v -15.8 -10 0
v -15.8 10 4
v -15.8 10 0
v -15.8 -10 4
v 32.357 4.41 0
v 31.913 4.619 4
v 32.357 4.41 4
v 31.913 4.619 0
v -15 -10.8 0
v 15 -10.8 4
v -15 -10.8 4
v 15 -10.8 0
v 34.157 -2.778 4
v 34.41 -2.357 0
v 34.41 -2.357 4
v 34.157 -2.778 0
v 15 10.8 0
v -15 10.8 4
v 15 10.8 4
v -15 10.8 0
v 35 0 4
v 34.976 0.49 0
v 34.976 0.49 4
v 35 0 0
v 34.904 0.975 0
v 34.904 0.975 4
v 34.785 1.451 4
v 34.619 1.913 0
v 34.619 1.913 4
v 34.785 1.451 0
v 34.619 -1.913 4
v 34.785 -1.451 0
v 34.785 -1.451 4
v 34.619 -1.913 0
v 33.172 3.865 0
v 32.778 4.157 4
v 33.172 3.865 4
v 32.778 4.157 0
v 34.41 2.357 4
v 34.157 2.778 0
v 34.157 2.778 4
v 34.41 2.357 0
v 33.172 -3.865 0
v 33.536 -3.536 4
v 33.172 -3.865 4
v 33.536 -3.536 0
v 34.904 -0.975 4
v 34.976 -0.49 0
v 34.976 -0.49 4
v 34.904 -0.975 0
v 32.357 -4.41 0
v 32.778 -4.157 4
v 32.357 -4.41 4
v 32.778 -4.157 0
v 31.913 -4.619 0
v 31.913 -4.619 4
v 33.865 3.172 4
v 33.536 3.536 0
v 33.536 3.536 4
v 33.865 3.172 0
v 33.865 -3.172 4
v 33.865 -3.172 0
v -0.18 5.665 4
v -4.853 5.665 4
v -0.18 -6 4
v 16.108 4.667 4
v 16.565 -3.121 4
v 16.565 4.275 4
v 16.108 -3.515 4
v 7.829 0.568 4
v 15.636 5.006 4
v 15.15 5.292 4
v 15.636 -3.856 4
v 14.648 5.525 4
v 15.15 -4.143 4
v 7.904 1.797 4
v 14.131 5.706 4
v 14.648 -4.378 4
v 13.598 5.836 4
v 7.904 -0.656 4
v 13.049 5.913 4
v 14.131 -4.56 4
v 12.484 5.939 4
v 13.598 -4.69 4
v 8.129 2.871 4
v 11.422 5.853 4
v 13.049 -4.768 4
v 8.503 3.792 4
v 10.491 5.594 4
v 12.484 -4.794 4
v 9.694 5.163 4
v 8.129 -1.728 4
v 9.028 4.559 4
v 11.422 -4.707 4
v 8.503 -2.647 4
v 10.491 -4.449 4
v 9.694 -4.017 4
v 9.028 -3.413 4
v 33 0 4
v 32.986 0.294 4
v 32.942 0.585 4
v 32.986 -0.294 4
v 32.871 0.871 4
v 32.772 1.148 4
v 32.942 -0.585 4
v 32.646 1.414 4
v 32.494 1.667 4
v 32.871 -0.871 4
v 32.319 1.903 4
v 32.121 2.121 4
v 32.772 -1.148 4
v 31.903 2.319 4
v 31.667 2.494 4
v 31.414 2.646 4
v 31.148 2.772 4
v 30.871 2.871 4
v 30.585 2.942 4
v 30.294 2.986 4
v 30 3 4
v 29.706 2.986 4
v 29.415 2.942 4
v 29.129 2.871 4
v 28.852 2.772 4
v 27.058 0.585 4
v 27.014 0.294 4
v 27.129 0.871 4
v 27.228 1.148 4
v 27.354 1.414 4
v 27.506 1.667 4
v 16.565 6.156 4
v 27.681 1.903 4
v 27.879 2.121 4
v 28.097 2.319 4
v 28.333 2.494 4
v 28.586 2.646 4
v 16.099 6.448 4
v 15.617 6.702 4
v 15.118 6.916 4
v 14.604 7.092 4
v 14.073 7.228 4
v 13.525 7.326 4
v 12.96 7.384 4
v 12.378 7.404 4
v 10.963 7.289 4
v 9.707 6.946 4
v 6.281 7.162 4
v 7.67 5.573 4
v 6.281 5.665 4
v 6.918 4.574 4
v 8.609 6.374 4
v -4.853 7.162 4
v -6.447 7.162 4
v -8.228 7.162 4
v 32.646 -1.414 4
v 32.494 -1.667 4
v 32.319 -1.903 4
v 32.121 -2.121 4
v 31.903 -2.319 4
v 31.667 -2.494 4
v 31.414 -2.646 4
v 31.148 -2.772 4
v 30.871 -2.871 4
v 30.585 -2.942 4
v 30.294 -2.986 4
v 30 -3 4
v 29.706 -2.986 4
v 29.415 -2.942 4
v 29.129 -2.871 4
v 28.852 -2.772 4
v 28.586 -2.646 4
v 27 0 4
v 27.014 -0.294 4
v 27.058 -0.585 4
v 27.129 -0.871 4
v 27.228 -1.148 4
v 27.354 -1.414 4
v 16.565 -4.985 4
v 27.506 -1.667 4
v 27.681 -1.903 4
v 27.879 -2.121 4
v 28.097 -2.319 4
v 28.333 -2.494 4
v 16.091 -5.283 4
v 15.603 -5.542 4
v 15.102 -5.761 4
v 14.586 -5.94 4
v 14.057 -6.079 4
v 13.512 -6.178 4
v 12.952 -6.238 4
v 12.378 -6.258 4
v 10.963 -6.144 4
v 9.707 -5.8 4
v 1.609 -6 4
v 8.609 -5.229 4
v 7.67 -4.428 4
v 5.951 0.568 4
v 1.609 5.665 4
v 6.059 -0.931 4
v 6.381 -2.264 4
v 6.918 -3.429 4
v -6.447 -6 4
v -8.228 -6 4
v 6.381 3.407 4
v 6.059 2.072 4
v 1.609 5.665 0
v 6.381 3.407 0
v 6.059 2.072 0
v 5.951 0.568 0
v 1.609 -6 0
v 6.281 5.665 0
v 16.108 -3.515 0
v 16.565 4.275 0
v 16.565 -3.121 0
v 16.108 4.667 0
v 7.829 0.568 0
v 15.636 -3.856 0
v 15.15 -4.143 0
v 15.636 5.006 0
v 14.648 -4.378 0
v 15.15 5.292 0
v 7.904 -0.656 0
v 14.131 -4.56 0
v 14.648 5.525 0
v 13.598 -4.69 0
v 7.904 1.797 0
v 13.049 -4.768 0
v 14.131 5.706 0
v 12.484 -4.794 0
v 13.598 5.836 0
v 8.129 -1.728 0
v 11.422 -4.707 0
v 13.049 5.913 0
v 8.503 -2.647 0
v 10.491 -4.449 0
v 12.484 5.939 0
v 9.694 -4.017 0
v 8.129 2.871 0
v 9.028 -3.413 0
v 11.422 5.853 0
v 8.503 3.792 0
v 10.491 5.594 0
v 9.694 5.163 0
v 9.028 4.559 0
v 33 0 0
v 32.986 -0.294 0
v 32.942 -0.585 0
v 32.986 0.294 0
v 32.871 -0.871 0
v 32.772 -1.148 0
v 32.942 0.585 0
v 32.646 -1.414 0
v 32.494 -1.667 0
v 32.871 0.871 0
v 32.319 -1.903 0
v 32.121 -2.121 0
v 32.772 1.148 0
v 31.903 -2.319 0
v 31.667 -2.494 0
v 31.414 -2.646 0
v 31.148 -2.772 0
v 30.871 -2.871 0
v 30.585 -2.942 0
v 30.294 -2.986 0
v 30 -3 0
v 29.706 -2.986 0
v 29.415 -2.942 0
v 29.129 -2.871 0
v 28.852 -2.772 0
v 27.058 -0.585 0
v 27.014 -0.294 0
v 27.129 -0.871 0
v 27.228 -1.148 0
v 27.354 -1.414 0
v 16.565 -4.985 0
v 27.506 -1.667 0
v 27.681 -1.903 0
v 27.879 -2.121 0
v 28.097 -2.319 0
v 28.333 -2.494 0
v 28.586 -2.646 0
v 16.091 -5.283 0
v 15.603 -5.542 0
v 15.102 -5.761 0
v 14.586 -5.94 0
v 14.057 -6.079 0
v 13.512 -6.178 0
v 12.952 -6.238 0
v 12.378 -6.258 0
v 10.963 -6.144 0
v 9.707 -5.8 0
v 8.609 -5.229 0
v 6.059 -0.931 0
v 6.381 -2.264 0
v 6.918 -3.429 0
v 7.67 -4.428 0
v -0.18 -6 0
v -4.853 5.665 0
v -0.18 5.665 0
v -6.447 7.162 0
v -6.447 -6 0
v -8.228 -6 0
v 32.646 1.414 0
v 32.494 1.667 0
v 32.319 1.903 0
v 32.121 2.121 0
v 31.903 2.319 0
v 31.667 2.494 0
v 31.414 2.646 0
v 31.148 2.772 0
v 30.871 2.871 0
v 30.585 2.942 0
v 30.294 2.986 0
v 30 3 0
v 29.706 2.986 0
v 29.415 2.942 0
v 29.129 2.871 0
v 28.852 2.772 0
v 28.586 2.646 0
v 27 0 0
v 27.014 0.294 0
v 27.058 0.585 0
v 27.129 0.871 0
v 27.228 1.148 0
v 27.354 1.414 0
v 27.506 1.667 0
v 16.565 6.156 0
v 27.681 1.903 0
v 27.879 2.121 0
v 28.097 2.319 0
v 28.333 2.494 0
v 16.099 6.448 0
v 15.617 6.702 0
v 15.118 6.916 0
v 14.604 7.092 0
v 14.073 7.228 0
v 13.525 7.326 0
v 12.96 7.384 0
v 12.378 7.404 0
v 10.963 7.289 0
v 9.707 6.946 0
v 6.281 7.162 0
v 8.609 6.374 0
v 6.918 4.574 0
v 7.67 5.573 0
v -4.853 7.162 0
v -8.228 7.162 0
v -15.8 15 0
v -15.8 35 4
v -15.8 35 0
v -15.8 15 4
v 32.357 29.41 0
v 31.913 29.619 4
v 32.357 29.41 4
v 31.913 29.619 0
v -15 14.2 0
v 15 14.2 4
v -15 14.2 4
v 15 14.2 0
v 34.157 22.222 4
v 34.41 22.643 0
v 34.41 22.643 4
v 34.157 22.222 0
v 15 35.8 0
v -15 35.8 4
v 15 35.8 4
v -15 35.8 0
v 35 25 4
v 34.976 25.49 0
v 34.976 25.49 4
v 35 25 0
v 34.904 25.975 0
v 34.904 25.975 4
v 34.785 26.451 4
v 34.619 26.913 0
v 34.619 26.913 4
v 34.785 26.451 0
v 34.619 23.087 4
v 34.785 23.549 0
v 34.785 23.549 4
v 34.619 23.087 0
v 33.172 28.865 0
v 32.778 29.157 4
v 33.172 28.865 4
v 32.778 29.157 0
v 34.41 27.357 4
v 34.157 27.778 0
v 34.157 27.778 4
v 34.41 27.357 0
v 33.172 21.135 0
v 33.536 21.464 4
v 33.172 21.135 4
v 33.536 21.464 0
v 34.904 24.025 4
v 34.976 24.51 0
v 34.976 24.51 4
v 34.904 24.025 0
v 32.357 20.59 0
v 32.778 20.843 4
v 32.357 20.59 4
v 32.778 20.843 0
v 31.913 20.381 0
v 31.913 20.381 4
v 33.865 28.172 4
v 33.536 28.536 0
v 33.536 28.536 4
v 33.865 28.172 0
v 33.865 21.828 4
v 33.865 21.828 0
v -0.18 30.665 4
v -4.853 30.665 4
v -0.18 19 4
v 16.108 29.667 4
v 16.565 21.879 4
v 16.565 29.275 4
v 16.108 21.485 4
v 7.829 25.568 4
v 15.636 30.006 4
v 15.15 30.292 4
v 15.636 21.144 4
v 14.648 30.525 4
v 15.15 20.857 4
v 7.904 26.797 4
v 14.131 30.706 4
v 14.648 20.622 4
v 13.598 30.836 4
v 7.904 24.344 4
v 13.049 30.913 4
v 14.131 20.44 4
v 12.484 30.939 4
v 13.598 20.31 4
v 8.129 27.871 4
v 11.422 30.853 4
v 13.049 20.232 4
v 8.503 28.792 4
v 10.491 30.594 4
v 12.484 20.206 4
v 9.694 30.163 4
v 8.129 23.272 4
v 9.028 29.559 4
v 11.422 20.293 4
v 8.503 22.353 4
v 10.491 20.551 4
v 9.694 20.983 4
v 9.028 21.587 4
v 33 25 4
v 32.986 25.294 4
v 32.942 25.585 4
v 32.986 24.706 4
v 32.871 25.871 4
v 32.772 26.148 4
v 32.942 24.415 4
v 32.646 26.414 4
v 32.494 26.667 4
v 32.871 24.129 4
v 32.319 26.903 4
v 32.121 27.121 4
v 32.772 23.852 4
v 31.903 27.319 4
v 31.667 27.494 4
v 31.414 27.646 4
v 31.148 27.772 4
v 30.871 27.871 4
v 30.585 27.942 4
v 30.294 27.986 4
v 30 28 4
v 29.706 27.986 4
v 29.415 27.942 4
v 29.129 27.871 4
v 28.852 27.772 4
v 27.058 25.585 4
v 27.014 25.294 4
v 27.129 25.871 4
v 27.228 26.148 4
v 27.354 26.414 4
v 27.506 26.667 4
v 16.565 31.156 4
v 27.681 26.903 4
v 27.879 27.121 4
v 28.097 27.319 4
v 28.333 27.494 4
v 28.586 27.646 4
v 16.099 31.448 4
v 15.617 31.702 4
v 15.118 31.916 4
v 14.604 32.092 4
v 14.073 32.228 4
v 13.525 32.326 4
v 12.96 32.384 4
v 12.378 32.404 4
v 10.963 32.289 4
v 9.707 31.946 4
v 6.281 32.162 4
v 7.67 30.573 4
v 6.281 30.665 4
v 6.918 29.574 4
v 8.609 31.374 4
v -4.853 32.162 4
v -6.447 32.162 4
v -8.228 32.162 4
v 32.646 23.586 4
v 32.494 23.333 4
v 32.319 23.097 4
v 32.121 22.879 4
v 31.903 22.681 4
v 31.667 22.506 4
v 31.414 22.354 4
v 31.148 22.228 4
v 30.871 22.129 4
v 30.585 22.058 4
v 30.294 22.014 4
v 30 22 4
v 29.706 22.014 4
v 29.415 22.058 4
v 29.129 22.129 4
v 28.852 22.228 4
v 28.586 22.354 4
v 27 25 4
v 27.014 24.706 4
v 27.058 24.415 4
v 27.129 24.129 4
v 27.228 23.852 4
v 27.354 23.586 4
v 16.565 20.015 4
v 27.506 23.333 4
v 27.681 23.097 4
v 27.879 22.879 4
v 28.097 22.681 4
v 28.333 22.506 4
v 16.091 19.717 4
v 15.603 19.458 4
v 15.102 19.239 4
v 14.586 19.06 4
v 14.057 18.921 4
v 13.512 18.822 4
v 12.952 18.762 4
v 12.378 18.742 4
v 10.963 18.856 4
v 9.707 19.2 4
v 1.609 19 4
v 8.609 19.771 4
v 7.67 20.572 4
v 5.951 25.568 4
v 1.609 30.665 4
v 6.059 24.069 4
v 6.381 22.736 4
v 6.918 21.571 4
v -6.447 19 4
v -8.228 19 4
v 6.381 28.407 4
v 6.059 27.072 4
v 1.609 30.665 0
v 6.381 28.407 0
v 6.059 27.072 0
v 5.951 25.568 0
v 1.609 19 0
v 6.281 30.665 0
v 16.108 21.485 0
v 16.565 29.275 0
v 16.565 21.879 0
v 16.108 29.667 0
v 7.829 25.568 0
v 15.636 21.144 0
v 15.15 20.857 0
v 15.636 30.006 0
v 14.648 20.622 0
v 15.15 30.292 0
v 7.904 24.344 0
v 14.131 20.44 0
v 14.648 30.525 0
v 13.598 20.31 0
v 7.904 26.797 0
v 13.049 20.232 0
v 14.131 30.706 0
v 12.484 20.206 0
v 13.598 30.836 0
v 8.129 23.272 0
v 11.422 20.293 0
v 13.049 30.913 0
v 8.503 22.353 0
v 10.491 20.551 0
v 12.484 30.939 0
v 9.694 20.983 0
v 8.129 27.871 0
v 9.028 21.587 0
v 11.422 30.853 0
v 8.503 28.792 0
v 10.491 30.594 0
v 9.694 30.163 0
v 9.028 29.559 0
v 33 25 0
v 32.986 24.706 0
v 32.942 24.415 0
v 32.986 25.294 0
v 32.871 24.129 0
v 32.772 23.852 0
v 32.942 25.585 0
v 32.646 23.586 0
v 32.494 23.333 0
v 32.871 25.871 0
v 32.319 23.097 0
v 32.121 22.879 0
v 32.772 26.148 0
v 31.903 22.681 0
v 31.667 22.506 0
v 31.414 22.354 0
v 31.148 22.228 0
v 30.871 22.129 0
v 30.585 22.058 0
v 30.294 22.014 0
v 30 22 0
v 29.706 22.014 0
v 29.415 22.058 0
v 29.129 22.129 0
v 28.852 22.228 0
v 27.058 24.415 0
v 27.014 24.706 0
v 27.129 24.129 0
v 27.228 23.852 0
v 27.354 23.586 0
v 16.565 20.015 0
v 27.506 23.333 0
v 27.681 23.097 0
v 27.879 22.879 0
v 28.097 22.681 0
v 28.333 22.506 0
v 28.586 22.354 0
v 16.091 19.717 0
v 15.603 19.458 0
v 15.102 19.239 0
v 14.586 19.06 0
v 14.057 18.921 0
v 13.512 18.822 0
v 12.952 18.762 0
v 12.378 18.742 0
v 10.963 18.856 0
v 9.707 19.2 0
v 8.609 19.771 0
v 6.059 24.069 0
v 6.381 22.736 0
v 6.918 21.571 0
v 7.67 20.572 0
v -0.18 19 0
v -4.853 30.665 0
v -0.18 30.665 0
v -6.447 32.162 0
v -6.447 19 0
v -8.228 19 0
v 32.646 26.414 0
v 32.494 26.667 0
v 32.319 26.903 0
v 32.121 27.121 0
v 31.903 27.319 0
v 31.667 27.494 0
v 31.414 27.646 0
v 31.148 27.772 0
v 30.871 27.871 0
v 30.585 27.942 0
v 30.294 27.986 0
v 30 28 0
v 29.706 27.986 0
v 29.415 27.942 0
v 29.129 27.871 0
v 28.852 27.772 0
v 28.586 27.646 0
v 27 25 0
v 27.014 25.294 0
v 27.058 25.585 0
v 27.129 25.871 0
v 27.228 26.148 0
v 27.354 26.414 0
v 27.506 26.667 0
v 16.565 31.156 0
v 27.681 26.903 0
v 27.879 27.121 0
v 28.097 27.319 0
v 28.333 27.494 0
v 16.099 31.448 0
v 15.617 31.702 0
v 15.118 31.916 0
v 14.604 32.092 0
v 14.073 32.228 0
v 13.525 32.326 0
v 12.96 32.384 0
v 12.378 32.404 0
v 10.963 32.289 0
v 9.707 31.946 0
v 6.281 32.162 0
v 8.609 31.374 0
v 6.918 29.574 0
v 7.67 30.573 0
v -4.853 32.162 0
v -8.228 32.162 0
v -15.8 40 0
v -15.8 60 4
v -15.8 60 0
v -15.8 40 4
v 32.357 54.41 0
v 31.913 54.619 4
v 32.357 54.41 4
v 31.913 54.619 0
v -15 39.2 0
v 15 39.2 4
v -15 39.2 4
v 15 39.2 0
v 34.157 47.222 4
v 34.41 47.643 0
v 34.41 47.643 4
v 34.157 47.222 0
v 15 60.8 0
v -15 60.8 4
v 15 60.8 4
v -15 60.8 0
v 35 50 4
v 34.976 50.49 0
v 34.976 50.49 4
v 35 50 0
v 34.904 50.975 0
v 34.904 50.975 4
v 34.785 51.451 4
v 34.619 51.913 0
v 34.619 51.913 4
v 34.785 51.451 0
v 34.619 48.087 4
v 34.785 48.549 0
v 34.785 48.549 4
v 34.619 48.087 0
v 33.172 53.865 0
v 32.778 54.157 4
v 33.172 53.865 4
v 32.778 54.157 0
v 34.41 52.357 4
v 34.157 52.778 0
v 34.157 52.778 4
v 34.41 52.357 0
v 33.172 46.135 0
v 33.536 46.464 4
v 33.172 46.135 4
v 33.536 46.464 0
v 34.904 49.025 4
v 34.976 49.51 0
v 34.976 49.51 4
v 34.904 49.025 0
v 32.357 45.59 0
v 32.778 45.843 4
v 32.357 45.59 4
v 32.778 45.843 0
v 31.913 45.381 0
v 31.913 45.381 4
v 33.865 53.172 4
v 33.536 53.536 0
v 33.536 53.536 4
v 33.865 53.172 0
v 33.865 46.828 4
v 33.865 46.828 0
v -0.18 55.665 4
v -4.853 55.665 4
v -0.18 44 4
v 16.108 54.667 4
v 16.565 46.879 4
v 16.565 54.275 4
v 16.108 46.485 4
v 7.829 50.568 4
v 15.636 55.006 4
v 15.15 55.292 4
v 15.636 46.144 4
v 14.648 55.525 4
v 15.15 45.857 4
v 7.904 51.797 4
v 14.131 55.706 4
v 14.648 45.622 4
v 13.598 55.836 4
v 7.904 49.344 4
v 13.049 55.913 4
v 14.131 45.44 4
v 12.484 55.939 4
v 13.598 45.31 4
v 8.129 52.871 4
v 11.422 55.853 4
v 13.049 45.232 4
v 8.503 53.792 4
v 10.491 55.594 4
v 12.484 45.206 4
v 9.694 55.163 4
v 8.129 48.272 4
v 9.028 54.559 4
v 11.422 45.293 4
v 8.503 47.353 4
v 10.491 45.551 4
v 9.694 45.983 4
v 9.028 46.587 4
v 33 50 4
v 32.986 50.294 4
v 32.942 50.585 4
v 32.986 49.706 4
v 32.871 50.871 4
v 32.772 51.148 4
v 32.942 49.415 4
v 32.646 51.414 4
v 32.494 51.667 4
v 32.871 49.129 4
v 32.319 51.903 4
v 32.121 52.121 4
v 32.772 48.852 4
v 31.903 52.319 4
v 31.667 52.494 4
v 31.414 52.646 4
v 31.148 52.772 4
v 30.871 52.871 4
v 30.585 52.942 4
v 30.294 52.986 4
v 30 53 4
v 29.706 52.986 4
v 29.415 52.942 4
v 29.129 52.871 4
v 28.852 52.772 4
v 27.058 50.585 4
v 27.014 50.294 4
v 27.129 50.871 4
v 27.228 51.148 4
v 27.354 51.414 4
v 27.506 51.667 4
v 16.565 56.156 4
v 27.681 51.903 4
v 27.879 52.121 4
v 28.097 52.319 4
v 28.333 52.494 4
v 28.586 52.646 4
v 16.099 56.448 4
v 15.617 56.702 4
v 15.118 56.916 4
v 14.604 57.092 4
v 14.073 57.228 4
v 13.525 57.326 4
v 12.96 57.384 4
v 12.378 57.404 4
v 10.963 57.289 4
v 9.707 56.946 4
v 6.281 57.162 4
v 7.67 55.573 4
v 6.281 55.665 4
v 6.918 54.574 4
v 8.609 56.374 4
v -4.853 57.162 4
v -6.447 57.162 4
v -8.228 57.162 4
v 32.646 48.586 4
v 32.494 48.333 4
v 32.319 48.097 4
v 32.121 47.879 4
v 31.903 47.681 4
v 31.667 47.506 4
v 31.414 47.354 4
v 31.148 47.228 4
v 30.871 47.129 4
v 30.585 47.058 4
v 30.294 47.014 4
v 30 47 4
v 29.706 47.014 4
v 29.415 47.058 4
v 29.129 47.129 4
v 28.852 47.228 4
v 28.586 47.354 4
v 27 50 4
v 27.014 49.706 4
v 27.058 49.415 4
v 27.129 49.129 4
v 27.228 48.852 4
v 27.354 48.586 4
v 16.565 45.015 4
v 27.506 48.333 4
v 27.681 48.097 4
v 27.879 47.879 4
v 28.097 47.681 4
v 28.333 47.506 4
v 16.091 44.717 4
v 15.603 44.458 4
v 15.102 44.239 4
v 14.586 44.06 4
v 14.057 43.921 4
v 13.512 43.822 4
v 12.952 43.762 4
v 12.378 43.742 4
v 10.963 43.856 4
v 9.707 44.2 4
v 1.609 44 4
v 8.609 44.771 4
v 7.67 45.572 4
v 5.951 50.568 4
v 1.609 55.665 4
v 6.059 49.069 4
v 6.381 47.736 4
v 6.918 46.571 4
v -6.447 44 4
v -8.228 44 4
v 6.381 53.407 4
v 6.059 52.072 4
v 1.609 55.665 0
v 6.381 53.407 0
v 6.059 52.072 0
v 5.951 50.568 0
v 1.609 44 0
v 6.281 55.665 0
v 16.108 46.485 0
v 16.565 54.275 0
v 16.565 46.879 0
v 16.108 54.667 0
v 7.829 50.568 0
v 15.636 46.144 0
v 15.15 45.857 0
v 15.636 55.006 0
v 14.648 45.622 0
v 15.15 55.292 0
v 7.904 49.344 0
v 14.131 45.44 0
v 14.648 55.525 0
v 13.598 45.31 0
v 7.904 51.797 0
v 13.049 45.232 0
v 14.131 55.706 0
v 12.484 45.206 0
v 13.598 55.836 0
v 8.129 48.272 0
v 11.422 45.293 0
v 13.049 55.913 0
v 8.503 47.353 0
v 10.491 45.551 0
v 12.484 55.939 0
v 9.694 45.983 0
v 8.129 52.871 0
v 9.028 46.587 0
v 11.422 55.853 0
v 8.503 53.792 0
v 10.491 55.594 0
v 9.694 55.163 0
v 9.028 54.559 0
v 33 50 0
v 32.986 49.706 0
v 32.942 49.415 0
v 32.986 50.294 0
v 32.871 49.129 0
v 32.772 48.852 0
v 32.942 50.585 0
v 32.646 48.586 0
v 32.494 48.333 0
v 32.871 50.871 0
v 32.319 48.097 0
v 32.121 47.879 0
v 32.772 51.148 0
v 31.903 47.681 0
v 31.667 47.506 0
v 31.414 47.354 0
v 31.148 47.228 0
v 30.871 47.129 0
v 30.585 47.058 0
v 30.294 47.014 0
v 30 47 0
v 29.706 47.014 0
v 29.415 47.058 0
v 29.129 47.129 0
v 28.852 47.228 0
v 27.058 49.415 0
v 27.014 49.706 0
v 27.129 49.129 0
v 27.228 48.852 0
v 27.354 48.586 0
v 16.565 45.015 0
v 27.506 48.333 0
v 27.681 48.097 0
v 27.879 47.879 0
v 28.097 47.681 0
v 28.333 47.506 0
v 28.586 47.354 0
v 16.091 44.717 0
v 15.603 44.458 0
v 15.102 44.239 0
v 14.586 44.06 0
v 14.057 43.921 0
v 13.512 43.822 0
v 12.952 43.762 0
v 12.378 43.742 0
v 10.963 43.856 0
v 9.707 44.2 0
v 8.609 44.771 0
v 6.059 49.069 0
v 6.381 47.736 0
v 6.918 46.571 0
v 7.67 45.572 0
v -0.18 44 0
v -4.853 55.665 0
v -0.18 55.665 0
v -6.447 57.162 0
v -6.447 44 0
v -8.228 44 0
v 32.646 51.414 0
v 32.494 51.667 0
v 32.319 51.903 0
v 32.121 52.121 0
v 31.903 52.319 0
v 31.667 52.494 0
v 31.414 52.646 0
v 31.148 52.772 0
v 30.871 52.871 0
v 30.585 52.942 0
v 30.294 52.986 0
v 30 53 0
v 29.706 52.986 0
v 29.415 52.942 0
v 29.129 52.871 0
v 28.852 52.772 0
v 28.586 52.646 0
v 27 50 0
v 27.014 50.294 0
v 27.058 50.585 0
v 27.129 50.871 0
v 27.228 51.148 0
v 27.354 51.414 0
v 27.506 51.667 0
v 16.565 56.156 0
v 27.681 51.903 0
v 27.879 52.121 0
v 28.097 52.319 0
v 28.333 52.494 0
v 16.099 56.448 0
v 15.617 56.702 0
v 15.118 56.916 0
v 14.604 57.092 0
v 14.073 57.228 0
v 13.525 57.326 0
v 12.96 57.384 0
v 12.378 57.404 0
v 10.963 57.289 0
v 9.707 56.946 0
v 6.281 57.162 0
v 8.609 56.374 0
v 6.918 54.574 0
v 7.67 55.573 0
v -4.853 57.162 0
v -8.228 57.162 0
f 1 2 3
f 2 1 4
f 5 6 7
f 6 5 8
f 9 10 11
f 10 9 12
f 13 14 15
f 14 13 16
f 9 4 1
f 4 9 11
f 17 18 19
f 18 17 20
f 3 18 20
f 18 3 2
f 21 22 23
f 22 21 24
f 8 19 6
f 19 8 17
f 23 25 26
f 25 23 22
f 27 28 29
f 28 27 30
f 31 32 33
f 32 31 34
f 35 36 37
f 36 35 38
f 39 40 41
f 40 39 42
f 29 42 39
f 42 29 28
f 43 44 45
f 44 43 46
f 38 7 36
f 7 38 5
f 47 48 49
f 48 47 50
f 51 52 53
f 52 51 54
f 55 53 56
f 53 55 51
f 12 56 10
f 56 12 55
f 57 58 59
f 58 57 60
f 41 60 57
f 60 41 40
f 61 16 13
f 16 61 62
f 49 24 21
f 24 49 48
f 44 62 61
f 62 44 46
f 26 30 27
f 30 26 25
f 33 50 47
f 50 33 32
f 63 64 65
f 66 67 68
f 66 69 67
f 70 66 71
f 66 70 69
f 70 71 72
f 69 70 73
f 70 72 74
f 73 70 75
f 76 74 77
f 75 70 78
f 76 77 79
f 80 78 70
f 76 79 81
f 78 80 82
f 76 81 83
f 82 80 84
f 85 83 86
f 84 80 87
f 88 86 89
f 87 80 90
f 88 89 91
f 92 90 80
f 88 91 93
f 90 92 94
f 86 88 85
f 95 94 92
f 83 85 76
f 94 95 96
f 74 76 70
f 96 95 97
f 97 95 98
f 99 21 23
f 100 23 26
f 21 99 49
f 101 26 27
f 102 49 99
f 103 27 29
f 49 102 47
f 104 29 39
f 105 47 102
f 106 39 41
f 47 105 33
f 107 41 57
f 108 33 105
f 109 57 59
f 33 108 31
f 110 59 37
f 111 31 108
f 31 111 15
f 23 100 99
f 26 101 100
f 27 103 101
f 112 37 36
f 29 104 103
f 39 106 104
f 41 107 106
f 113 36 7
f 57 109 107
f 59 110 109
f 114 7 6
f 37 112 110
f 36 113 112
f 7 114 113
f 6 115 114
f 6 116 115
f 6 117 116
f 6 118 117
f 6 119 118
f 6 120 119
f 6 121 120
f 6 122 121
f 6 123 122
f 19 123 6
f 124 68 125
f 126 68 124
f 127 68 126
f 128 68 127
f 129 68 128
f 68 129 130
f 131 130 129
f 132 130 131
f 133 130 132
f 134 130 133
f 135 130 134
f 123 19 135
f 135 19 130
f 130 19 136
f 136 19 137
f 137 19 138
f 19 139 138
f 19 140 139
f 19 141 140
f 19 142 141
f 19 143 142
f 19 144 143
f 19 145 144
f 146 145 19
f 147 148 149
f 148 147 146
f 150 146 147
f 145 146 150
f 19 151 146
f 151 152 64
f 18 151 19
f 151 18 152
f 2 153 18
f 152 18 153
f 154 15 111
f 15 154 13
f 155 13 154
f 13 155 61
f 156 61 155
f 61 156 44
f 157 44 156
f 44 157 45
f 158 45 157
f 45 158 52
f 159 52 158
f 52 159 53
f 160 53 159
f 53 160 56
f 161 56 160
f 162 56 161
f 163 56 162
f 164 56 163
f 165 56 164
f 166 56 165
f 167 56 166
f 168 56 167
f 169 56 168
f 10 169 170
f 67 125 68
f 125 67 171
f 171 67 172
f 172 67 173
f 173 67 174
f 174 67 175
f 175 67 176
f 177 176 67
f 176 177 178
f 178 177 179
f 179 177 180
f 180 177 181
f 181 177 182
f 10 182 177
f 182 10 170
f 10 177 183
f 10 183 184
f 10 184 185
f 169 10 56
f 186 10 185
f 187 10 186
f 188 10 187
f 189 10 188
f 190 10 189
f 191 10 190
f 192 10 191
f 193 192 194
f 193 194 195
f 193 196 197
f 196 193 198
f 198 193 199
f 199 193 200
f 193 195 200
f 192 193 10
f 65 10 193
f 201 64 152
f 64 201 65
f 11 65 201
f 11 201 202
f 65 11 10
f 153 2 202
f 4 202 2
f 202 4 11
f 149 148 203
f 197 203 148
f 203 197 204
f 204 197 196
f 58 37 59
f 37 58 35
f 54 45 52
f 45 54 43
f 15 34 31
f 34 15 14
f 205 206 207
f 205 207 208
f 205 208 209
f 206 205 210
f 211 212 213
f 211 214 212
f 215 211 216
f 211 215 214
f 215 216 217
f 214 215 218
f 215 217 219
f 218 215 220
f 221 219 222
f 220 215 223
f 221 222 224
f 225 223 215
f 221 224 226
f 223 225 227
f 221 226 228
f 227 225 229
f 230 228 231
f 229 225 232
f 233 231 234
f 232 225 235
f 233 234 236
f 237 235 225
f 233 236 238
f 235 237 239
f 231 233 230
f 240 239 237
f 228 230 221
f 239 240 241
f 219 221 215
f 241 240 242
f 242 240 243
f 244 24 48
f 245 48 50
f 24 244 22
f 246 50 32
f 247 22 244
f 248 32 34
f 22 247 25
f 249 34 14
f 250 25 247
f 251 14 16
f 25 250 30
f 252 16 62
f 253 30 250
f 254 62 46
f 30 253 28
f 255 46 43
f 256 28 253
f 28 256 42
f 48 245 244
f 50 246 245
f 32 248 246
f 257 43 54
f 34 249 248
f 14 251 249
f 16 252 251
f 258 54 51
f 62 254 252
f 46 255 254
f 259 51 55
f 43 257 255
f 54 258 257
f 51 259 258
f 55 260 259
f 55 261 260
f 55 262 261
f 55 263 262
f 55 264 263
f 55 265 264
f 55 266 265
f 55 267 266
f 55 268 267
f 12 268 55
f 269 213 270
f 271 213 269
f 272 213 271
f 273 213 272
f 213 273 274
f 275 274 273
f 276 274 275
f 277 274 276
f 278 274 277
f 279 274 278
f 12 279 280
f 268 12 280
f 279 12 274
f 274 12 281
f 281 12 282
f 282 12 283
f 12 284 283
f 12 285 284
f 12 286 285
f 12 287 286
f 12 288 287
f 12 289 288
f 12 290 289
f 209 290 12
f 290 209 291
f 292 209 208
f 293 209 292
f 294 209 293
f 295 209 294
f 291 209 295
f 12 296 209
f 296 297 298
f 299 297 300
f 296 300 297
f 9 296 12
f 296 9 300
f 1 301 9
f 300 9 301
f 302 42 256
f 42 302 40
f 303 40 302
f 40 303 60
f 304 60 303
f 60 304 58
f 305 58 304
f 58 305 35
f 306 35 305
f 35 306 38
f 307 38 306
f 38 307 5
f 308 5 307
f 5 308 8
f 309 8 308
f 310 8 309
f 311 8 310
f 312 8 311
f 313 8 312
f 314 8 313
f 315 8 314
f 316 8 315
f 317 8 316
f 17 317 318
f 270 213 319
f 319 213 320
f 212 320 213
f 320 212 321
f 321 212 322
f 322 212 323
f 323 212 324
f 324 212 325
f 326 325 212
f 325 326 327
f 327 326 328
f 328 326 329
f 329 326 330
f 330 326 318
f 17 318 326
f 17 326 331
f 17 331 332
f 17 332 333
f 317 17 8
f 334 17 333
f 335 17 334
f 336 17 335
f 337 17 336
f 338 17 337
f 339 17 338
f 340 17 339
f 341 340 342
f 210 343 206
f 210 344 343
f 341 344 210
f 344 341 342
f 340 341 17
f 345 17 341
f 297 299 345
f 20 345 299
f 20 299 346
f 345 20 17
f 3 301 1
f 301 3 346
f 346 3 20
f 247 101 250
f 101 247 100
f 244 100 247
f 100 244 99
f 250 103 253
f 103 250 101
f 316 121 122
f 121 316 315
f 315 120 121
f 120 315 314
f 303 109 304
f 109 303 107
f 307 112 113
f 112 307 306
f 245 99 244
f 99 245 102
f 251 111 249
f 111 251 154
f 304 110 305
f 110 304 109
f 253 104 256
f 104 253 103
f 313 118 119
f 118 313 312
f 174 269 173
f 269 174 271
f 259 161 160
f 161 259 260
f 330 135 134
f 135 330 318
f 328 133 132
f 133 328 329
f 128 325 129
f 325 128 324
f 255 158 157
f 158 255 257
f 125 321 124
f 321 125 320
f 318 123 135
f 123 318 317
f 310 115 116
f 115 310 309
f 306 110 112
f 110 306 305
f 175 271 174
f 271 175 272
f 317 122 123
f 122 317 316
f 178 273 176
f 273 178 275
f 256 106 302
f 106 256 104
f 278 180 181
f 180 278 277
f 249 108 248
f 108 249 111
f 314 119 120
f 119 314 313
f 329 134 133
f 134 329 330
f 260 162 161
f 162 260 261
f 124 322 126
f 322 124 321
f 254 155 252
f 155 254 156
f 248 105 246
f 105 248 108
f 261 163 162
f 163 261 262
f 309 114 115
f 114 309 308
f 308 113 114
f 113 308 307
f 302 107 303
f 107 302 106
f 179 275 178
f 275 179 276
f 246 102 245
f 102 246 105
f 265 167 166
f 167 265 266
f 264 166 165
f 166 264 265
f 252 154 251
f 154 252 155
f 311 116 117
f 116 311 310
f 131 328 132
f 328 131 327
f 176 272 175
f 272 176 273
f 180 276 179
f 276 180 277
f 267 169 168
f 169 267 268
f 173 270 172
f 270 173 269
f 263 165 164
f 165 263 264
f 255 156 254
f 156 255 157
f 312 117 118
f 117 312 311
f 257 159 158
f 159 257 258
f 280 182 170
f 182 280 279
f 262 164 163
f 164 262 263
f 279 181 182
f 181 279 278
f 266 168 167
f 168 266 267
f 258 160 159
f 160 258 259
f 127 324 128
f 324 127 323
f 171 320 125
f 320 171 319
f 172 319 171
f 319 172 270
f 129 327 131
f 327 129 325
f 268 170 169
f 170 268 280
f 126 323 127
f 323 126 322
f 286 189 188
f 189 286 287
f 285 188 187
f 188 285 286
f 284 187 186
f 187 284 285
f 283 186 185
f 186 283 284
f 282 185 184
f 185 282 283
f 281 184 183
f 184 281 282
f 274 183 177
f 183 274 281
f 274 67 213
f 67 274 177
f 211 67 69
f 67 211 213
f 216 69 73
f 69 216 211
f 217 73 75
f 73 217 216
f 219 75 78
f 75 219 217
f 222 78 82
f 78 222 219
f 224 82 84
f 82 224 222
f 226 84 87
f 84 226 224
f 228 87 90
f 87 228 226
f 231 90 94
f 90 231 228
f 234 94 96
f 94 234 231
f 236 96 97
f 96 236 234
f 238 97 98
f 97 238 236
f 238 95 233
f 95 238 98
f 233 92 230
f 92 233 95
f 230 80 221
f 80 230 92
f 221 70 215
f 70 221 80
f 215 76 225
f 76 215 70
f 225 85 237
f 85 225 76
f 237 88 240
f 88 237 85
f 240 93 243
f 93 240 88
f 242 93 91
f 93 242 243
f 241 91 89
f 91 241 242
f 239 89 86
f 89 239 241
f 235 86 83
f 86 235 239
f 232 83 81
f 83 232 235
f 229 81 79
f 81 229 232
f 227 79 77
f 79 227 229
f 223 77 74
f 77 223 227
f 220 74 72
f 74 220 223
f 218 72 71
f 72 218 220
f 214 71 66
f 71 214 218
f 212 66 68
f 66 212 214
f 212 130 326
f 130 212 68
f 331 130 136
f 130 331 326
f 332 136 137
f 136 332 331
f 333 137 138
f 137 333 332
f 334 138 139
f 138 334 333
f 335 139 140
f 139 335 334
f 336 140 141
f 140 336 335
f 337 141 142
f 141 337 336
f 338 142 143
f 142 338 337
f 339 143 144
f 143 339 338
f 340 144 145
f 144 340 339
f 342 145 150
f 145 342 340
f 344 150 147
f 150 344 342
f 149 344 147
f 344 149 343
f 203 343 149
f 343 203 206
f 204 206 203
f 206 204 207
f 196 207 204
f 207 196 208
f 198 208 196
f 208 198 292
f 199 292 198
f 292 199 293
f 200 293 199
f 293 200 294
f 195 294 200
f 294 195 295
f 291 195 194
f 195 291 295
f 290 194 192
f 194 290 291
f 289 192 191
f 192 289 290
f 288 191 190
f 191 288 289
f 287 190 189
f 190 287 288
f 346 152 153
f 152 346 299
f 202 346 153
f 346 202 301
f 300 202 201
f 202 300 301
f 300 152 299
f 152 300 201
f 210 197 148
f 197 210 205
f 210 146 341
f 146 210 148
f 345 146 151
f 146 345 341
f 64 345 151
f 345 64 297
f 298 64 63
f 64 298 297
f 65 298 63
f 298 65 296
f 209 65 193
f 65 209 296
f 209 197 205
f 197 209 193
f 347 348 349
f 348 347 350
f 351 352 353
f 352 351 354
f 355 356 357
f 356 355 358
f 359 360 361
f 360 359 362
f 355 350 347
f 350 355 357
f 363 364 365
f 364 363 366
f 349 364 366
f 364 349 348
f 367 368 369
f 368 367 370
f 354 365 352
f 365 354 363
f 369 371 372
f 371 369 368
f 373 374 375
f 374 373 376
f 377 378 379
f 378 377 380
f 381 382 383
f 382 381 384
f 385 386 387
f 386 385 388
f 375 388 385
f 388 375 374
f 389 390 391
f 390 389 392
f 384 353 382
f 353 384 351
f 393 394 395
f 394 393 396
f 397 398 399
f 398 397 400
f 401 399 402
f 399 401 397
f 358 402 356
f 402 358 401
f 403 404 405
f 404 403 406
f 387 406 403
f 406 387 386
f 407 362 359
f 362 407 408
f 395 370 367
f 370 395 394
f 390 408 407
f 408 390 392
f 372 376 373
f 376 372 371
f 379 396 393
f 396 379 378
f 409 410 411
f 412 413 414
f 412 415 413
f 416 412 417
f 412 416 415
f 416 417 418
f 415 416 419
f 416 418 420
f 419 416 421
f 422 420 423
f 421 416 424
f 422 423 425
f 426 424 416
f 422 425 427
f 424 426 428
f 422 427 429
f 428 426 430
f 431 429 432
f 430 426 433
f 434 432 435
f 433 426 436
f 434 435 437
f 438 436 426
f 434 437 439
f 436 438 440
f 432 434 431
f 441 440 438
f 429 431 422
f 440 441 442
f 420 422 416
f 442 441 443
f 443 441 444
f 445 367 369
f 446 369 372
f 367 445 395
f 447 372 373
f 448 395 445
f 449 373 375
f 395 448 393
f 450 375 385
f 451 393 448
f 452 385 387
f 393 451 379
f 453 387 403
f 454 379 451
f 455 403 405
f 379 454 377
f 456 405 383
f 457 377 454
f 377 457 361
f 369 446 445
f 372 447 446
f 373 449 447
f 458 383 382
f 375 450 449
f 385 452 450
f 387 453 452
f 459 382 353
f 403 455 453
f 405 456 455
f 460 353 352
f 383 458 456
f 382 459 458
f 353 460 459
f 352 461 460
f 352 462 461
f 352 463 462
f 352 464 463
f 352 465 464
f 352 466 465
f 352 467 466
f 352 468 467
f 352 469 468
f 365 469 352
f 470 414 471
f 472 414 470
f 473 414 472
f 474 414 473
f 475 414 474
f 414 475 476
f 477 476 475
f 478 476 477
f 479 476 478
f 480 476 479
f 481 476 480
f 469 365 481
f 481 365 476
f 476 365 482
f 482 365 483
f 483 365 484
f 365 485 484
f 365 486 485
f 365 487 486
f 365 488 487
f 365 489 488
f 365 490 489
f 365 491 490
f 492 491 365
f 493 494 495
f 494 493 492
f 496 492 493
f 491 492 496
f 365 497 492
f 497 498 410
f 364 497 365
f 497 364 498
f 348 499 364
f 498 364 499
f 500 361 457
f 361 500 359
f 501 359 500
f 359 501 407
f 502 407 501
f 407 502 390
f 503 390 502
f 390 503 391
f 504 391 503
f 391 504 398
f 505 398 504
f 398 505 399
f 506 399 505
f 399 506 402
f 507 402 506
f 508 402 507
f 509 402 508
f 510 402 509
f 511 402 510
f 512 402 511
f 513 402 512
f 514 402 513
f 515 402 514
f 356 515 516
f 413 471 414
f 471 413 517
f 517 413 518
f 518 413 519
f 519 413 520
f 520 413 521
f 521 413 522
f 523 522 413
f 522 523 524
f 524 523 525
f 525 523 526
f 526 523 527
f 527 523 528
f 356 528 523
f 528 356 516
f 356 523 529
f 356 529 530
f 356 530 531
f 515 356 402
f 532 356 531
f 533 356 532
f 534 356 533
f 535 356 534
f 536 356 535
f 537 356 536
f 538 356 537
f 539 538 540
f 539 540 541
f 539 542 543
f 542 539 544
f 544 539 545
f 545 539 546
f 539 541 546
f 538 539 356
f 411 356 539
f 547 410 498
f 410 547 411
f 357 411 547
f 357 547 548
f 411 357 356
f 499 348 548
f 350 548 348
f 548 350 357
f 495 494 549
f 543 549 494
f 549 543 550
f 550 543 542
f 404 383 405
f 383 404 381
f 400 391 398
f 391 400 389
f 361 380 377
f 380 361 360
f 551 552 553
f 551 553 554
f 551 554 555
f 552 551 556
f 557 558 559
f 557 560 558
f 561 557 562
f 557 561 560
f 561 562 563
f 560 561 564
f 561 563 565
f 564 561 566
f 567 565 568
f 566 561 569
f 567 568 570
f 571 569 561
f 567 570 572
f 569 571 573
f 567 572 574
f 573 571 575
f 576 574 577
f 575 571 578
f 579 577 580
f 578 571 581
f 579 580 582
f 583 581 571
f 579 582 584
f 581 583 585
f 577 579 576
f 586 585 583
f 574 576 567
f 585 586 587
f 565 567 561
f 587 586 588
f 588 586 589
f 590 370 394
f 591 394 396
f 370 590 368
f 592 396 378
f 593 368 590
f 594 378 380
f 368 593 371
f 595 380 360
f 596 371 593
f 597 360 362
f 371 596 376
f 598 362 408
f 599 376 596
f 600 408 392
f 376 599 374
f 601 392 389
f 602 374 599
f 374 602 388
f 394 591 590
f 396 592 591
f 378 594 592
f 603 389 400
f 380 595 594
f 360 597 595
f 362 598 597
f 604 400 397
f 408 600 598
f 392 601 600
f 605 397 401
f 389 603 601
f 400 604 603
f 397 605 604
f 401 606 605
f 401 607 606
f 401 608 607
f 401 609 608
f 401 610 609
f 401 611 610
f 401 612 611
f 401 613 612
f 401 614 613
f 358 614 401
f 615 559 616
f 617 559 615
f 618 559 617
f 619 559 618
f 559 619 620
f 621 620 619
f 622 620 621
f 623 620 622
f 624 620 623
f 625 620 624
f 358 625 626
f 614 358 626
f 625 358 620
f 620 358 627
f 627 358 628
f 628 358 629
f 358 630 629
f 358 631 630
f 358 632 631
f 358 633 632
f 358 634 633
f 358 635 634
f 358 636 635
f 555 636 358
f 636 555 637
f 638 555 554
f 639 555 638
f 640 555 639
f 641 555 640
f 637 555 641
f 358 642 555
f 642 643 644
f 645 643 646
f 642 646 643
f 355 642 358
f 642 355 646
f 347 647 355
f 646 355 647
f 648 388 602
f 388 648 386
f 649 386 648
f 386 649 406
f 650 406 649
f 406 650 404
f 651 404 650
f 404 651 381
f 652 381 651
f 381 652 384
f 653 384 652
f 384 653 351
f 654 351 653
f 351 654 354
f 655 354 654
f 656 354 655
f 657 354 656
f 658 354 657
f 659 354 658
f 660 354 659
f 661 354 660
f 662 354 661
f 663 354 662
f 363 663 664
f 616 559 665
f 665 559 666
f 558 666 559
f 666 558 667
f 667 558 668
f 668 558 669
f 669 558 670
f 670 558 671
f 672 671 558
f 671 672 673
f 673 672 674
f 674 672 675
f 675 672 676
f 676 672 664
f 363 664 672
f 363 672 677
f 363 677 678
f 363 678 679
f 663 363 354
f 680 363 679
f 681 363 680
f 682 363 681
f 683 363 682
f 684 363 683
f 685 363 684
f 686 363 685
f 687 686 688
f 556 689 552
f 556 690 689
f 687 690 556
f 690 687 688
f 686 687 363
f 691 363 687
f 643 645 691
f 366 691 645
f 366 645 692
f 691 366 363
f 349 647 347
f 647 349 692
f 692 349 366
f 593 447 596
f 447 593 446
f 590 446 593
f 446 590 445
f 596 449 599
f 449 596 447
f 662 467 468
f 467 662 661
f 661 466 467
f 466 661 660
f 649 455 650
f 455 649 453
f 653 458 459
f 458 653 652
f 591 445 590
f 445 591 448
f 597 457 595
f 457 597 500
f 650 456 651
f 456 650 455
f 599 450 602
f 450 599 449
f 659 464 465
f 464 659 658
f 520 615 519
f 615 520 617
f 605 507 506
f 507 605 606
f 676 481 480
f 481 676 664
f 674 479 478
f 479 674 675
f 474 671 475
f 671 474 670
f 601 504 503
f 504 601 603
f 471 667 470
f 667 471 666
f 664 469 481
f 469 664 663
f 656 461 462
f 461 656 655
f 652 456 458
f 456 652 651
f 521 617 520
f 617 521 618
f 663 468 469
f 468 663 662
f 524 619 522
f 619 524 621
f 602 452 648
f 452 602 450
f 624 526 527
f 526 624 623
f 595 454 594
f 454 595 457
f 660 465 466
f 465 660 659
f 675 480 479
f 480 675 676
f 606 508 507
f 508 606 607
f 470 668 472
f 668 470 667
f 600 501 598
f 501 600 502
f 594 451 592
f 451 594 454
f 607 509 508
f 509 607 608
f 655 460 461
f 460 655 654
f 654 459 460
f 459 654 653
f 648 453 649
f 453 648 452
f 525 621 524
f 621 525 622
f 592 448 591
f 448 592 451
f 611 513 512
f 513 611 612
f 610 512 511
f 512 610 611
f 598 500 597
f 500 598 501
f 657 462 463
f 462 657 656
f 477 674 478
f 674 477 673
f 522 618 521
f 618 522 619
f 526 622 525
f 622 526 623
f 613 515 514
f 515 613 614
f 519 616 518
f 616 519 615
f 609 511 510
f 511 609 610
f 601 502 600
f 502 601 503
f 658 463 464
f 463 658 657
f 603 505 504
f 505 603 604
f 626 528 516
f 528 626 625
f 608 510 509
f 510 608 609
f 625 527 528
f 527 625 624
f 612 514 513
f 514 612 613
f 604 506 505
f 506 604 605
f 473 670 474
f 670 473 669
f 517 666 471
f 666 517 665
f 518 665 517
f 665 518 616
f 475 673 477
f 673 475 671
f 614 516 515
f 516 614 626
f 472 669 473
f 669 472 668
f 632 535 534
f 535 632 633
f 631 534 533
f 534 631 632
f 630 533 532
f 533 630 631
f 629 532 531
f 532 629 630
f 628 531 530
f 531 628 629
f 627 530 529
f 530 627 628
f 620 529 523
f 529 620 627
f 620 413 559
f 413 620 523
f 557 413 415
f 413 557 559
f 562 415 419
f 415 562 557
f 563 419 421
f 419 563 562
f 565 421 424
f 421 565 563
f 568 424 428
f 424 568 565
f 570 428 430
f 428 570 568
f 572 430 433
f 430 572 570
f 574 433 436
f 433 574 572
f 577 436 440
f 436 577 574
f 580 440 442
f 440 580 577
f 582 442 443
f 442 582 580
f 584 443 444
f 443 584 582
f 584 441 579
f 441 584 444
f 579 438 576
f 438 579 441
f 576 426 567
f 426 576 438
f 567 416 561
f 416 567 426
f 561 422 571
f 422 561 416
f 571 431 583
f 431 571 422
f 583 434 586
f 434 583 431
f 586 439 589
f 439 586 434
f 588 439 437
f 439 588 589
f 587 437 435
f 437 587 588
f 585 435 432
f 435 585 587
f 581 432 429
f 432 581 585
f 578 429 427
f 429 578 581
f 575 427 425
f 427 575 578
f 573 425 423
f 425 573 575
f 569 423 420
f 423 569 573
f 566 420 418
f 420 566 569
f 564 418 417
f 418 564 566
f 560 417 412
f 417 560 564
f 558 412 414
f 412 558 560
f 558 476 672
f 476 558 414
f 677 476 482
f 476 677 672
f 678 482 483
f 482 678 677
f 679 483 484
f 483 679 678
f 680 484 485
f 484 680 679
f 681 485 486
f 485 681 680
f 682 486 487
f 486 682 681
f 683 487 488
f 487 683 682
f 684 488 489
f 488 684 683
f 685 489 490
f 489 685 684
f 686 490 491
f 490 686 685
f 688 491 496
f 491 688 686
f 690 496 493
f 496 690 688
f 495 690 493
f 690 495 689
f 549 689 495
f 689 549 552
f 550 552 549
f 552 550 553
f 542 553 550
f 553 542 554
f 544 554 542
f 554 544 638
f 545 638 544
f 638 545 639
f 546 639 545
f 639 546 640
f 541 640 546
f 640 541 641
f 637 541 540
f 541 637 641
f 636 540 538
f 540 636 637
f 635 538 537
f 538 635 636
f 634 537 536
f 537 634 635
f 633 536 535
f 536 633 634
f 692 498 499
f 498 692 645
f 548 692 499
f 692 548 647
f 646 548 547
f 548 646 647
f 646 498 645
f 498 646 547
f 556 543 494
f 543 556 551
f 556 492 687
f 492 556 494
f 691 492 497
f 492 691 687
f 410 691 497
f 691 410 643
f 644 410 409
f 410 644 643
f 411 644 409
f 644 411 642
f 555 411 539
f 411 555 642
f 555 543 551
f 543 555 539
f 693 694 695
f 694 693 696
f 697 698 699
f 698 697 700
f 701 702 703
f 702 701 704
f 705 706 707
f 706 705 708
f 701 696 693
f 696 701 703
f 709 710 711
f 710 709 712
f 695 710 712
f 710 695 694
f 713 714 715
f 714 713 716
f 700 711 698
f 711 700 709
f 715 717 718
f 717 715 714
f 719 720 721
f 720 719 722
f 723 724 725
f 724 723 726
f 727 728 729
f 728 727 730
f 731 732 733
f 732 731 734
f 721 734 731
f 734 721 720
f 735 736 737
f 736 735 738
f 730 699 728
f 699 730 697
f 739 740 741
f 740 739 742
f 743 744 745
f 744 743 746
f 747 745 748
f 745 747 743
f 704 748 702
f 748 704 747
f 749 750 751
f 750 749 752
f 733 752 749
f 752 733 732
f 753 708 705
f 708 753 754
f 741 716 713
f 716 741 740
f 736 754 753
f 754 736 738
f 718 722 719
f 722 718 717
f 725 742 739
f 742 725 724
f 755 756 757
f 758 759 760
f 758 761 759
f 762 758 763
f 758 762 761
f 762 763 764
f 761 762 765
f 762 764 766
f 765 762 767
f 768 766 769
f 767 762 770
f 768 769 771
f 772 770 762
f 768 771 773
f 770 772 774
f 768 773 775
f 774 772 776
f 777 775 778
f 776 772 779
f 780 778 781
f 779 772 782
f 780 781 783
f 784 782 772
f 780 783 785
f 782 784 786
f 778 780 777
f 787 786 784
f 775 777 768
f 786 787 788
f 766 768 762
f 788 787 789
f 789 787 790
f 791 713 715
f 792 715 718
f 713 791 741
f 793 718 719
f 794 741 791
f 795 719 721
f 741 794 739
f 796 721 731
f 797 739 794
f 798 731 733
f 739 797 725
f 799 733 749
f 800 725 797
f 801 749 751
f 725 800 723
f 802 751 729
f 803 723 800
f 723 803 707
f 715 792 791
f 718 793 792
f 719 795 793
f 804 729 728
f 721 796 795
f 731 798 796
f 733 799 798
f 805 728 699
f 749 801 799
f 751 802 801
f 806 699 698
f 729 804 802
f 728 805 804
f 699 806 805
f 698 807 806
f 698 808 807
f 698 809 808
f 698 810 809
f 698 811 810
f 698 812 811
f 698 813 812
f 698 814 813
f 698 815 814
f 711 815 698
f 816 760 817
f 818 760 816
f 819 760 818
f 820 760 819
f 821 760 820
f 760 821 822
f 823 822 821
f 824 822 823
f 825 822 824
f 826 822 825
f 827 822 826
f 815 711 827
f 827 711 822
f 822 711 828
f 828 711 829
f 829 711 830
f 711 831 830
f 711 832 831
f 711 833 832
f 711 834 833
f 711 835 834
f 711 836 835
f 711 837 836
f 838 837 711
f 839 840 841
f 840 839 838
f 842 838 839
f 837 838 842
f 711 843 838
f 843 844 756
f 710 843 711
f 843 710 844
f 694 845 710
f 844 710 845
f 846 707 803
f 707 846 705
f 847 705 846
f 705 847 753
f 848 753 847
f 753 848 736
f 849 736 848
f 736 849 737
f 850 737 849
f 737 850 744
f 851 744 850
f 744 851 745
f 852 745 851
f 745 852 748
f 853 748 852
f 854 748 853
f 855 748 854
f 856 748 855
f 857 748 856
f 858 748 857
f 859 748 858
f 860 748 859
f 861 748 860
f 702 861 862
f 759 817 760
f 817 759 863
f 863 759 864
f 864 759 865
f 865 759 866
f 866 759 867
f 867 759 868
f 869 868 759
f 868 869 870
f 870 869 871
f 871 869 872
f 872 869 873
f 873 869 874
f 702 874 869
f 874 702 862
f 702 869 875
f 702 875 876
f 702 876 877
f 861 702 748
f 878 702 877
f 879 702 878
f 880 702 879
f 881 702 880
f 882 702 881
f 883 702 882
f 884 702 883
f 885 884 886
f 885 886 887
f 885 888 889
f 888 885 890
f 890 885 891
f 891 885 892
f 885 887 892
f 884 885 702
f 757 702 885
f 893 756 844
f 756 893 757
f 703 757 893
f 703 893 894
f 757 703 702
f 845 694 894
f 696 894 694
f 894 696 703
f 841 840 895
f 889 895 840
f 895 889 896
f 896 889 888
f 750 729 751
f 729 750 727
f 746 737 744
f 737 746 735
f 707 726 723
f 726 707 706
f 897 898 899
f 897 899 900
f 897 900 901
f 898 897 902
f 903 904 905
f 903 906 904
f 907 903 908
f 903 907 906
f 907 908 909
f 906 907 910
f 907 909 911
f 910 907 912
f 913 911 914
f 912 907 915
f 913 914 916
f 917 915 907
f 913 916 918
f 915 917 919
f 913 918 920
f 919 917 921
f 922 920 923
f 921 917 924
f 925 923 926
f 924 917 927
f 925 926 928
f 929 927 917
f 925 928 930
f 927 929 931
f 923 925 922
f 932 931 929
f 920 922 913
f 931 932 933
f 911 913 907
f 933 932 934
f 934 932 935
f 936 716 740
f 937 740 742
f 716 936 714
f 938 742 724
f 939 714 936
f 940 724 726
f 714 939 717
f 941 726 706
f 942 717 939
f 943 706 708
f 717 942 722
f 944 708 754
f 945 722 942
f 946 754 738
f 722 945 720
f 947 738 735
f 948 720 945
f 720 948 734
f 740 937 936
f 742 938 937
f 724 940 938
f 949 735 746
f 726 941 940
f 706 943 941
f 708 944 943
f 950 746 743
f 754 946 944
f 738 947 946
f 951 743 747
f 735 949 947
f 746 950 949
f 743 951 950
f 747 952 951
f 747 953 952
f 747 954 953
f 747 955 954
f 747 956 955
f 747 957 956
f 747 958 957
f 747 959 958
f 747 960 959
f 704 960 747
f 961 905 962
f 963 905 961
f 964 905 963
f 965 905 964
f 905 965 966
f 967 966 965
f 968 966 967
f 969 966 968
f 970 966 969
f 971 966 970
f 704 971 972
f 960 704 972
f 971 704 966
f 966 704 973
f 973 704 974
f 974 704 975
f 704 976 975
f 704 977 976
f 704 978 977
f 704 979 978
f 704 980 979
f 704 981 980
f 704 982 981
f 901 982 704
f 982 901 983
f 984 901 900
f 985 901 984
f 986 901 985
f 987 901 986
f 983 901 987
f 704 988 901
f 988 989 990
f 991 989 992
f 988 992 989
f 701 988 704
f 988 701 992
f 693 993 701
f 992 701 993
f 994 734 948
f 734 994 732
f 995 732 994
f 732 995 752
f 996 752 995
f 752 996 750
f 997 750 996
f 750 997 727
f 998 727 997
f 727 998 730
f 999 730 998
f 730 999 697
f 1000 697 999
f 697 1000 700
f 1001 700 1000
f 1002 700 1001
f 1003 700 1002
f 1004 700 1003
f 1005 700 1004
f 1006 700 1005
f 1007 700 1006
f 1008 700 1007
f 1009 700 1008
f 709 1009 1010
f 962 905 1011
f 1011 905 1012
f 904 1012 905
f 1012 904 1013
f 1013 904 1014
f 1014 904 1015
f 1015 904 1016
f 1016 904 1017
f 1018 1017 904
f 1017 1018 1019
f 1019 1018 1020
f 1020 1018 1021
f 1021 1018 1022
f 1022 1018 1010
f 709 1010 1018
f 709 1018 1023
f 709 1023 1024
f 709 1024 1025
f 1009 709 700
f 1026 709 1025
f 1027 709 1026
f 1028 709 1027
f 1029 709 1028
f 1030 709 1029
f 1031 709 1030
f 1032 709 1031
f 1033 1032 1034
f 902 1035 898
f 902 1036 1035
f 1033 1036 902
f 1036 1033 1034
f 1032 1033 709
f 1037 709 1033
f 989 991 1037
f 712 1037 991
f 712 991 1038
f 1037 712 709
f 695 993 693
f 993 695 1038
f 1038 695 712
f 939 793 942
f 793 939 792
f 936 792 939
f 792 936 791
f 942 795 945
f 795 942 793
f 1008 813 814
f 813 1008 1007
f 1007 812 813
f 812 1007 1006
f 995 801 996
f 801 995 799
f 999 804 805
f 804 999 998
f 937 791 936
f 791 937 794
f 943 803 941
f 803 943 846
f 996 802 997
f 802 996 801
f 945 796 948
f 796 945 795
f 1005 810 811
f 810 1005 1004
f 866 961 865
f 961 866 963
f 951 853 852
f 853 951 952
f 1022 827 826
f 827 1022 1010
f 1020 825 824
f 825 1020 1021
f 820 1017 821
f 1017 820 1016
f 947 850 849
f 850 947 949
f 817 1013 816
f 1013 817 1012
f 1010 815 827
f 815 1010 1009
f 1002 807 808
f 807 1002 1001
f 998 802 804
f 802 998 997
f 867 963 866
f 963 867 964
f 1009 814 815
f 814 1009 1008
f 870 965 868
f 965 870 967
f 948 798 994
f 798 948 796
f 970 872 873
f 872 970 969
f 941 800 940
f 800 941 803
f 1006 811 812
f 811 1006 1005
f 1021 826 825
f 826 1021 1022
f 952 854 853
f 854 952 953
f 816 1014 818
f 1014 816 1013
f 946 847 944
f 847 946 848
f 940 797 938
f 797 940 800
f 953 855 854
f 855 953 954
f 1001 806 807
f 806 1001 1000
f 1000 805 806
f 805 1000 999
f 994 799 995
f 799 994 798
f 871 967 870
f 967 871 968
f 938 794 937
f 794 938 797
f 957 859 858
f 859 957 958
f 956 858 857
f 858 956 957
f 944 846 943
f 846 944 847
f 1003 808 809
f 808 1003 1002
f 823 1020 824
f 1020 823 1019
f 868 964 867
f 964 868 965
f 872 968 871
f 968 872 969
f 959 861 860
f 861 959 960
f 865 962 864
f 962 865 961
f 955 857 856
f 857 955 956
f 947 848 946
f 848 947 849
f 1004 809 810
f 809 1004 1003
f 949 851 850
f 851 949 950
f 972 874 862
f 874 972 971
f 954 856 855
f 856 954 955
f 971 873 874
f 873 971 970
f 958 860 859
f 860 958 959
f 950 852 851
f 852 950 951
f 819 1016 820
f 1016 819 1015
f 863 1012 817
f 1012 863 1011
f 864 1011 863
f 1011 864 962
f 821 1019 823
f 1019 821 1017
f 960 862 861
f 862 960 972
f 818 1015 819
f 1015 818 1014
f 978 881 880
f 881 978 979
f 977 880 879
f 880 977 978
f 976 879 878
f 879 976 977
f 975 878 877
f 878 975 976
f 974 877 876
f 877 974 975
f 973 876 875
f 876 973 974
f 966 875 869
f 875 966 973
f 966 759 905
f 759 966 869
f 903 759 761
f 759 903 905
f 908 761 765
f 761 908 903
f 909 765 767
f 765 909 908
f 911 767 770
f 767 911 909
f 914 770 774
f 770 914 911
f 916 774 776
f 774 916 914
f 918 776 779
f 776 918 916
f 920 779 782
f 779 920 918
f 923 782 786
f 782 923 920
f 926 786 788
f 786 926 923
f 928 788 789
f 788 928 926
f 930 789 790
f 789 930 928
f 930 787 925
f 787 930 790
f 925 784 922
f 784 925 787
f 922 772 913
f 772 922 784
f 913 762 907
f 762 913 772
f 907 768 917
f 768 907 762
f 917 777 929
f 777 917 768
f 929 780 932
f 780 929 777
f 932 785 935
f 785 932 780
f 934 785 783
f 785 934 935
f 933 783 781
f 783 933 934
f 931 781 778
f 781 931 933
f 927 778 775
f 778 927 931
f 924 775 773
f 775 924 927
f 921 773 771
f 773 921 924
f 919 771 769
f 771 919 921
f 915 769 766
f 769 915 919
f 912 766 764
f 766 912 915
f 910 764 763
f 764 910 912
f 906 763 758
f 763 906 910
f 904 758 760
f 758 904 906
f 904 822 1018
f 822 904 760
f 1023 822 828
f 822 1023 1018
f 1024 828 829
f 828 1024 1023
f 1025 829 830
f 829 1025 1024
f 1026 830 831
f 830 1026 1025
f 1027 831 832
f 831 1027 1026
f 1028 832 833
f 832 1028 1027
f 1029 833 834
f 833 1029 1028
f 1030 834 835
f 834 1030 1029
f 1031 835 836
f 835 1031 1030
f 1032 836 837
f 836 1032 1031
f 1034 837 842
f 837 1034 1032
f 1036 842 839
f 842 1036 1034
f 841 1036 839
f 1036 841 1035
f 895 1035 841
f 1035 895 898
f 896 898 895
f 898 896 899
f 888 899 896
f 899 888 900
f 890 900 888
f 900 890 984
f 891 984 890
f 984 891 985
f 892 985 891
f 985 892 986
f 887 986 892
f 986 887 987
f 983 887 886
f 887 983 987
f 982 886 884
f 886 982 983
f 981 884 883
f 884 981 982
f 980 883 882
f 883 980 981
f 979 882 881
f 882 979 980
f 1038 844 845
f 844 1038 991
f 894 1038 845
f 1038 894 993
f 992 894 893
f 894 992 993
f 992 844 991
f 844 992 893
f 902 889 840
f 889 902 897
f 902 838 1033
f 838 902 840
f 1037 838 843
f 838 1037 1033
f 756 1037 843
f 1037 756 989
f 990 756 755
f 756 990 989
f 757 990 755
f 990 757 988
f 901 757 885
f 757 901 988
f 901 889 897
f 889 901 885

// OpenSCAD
module trinket_body(thicknes, tittle)
{
  difference(){

    linear_extrude(height=thicknes,convexity=10){

      hull(){
        offset(r=0.8){
          square([30,20],center=true);
        }
        translate([30,0,0]) circle(r=5,$fn=64);
      }
    }

    translate([30,0,0]) cylinder(h=thicknes*2+1,r=3,$fn=64,center=true);

    translate([-10,-6,0]){
      linear_extrude(height=15, convexity = 10,center=true){
        text(text=tittle, language="ua", font="Segoe Script:style=Book",size=13,$fn=30);}
    }
  }
}

trinket_body(4,"ITC");

translate([0,25,0]) trinket_body(4,"ITC");
translate([0,50,0]) trinket_body(4,"ITC");
